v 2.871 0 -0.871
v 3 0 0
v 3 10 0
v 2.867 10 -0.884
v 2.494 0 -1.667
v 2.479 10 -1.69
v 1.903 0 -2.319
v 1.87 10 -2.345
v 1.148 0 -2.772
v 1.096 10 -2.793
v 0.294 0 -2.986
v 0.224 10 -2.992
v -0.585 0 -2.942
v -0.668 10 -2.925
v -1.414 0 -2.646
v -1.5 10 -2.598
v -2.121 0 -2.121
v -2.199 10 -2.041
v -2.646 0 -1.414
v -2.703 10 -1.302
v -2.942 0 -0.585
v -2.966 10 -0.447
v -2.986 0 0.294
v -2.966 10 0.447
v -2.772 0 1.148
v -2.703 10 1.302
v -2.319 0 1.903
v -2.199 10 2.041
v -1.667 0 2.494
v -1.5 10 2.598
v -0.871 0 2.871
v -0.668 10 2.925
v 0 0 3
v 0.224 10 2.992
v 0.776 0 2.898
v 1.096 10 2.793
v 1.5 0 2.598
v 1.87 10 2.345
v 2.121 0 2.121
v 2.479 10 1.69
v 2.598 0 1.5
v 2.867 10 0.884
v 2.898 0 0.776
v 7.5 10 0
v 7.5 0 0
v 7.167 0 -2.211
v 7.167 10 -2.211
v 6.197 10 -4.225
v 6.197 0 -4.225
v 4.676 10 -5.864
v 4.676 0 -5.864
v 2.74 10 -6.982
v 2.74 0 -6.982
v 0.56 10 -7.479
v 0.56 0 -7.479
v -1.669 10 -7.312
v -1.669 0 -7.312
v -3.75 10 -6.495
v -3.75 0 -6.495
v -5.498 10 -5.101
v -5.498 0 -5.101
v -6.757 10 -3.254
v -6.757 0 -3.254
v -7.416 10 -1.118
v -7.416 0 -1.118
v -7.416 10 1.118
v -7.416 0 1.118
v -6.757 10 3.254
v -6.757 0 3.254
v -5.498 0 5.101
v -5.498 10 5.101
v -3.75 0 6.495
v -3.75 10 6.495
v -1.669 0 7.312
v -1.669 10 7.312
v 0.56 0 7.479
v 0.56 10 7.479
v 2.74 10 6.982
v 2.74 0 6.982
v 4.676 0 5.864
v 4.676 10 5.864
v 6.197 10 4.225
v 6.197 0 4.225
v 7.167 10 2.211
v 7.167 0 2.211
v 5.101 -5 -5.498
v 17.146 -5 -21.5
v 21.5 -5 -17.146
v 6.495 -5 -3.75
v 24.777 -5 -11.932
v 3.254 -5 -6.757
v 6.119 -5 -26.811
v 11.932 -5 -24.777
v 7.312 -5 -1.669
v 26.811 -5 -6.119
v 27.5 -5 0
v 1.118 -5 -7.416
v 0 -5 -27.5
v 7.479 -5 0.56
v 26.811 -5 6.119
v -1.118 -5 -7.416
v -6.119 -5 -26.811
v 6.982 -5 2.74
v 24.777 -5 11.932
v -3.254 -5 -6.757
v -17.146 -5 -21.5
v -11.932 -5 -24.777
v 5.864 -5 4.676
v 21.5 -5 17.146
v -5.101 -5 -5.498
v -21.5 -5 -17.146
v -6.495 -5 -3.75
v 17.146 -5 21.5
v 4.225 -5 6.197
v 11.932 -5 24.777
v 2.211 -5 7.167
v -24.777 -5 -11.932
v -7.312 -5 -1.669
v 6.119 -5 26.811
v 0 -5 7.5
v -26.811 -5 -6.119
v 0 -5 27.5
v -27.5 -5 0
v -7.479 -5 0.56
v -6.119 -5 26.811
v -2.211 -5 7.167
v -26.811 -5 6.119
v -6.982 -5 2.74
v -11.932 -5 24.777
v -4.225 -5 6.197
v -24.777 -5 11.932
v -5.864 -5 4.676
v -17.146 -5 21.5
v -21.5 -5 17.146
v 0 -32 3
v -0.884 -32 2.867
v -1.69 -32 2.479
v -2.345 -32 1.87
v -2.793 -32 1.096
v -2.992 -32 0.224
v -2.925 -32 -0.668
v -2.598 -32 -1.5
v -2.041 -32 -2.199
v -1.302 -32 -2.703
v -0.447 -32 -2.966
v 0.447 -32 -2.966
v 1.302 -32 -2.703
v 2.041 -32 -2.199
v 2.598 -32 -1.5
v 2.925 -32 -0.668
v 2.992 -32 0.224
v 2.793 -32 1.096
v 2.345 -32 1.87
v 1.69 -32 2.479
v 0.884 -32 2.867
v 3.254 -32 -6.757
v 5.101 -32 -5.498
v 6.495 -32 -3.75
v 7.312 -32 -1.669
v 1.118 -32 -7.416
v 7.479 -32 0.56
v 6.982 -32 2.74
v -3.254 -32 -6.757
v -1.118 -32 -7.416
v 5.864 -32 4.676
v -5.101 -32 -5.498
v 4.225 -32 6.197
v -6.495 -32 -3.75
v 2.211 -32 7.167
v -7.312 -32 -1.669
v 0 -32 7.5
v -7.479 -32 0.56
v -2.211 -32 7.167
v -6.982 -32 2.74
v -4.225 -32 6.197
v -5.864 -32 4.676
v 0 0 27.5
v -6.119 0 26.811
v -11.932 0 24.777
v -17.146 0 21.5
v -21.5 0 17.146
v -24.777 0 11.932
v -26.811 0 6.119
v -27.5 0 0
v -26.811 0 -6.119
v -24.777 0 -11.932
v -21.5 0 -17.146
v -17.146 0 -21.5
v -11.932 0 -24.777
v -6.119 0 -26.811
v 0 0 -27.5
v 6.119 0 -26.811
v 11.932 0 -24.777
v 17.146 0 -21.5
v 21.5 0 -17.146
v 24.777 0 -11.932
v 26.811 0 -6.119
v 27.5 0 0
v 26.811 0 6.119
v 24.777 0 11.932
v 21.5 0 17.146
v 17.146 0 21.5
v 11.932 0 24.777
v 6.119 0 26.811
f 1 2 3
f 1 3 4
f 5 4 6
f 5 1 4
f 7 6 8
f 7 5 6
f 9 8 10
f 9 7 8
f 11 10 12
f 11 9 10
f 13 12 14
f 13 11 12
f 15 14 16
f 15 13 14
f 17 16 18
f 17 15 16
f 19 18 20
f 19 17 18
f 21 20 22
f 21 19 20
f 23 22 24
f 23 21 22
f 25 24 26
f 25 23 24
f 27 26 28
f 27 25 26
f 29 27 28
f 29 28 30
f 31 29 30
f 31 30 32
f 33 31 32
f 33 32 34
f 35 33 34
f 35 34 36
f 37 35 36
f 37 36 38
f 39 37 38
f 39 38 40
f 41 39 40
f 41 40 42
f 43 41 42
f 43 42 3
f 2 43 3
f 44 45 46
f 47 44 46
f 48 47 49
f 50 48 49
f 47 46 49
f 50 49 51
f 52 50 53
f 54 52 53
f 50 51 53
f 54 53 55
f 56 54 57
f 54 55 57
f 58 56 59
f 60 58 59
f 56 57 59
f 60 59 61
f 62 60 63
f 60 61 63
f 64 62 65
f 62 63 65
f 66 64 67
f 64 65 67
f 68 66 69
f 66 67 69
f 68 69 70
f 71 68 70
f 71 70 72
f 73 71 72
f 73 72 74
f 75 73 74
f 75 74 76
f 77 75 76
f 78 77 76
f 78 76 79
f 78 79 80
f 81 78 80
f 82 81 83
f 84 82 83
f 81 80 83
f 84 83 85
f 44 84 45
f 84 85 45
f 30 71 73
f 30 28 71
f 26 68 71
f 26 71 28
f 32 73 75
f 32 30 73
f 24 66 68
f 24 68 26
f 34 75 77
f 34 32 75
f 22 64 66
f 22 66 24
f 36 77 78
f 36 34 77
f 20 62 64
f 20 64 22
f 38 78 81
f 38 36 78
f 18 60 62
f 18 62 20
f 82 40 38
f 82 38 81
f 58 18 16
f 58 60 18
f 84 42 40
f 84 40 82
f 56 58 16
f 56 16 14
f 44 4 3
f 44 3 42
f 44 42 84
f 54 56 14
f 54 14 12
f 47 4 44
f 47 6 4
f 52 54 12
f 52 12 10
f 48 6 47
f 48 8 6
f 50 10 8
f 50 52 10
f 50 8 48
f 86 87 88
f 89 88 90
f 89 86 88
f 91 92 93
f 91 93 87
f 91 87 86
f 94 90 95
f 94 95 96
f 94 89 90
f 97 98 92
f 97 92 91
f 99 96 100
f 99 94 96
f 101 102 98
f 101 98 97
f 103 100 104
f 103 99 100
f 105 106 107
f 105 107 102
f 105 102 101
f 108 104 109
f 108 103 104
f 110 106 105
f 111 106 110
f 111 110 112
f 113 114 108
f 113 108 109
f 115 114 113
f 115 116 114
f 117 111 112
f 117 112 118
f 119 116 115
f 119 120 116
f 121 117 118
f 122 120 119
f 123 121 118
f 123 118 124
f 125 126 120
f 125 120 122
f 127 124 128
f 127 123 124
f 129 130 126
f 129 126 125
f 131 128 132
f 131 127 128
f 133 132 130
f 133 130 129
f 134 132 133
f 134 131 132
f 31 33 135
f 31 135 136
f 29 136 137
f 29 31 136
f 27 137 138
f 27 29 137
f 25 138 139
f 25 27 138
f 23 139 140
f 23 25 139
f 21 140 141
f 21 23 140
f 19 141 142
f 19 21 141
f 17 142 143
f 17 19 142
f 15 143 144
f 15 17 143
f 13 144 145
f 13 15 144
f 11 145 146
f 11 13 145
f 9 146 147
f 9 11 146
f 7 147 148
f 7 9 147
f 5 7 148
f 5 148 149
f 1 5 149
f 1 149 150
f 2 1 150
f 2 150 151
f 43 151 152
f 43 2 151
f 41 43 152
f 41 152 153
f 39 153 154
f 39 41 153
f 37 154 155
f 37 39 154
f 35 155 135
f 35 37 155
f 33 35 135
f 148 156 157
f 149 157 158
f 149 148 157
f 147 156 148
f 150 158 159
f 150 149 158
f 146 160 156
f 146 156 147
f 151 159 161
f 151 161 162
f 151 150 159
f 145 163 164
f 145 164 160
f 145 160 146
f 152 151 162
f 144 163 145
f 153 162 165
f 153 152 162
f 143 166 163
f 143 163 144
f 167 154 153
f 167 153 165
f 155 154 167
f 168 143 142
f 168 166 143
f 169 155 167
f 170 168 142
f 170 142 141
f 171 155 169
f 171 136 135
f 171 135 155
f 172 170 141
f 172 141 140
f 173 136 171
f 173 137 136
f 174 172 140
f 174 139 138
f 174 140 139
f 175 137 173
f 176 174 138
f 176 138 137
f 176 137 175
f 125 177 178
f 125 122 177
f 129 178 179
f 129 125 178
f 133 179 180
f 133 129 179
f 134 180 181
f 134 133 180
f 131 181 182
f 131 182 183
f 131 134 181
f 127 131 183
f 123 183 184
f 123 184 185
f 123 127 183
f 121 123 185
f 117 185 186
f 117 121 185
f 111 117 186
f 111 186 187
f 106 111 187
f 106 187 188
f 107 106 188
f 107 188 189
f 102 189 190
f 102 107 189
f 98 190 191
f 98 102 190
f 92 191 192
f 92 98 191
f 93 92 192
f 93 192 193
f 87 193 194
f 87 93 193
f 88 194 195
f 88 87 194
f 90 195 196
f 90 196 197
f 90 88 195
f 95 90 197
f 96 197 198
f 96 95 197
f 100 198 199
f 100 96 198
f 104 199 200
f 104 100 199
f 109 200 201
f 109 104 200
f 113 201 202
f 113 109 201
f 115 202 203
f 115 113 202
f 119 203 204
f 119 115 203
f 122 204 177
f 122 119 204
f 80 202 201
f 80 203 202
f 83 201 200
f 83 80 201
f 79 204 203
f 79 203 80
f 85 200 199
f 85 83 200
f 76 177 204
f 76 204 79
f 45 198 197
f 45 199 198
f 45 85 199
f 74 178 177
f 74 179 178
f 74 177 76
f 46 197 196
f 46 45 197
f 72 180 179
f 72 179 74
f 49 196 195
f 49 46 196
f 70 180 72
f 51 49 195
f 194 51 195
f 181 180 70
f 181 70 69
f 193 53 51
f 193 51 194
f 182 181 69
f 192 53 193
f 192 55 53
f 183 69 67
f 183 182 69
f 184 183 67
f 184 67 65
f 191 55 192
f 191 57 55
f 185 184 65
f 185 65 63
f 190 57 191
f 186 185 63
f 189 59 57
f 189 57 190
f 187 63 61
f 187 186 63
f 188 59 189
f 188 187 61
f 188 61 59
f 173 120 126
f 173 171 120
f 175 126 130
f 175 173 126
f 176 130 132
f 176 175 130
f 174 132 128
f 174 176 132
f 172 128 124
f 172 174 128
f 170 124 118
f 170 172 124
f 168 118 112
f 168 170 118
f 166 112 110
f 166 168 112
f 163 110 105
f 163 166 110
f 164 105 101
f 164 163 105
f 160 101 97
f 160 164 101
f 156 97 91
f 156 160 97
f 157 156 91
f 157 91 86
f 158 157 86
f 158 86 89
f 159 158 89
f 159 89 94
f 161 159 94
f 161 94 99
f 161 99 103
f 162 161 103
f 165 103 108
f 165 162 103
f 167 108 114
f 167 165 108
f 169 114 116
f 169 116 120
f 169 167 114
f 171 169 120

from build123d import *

# Parameters (mm, degrees)
SKIZZE2_R                       = 7.5
SKIZZE2_R_2                     = 3
AUFSATZ_LINEAR_AUSTRAGEN1_DEPTH = 10


with BuildPart() as part:
    # Skizze1 → Rotation1 (revolve)
    with BuildSketch(Plane(origin=(0, 0, 0), x_dir=(0, 0, -1), z_dir=(1, 0, 0))):
        Polygon((-3, 0), (-27.5, 0), (-27.5, -5), (-7.5, -5), (-7.5, -32), (-3, -32), align=None)
    revolve(axis=Axis((0, 21.68541583, 0), (0, -1, 0)))

    # Skizze2 → Aufsatz-Linear austragen1 (add)
    with BuildSketch(Plane(origin=(0, 0, 0), x_dir=(1, 0, 0), z_dir=(0, 1, 0))):
        Circle(SKIZZE2_R)
        Circle(SKIZZE2_R_2, mode=Mode.SUBTRACT)
    extrude(amount=AUFSATZ_LINEAR_AUSTRAGEN1_DEPTH)


solid = part.part
